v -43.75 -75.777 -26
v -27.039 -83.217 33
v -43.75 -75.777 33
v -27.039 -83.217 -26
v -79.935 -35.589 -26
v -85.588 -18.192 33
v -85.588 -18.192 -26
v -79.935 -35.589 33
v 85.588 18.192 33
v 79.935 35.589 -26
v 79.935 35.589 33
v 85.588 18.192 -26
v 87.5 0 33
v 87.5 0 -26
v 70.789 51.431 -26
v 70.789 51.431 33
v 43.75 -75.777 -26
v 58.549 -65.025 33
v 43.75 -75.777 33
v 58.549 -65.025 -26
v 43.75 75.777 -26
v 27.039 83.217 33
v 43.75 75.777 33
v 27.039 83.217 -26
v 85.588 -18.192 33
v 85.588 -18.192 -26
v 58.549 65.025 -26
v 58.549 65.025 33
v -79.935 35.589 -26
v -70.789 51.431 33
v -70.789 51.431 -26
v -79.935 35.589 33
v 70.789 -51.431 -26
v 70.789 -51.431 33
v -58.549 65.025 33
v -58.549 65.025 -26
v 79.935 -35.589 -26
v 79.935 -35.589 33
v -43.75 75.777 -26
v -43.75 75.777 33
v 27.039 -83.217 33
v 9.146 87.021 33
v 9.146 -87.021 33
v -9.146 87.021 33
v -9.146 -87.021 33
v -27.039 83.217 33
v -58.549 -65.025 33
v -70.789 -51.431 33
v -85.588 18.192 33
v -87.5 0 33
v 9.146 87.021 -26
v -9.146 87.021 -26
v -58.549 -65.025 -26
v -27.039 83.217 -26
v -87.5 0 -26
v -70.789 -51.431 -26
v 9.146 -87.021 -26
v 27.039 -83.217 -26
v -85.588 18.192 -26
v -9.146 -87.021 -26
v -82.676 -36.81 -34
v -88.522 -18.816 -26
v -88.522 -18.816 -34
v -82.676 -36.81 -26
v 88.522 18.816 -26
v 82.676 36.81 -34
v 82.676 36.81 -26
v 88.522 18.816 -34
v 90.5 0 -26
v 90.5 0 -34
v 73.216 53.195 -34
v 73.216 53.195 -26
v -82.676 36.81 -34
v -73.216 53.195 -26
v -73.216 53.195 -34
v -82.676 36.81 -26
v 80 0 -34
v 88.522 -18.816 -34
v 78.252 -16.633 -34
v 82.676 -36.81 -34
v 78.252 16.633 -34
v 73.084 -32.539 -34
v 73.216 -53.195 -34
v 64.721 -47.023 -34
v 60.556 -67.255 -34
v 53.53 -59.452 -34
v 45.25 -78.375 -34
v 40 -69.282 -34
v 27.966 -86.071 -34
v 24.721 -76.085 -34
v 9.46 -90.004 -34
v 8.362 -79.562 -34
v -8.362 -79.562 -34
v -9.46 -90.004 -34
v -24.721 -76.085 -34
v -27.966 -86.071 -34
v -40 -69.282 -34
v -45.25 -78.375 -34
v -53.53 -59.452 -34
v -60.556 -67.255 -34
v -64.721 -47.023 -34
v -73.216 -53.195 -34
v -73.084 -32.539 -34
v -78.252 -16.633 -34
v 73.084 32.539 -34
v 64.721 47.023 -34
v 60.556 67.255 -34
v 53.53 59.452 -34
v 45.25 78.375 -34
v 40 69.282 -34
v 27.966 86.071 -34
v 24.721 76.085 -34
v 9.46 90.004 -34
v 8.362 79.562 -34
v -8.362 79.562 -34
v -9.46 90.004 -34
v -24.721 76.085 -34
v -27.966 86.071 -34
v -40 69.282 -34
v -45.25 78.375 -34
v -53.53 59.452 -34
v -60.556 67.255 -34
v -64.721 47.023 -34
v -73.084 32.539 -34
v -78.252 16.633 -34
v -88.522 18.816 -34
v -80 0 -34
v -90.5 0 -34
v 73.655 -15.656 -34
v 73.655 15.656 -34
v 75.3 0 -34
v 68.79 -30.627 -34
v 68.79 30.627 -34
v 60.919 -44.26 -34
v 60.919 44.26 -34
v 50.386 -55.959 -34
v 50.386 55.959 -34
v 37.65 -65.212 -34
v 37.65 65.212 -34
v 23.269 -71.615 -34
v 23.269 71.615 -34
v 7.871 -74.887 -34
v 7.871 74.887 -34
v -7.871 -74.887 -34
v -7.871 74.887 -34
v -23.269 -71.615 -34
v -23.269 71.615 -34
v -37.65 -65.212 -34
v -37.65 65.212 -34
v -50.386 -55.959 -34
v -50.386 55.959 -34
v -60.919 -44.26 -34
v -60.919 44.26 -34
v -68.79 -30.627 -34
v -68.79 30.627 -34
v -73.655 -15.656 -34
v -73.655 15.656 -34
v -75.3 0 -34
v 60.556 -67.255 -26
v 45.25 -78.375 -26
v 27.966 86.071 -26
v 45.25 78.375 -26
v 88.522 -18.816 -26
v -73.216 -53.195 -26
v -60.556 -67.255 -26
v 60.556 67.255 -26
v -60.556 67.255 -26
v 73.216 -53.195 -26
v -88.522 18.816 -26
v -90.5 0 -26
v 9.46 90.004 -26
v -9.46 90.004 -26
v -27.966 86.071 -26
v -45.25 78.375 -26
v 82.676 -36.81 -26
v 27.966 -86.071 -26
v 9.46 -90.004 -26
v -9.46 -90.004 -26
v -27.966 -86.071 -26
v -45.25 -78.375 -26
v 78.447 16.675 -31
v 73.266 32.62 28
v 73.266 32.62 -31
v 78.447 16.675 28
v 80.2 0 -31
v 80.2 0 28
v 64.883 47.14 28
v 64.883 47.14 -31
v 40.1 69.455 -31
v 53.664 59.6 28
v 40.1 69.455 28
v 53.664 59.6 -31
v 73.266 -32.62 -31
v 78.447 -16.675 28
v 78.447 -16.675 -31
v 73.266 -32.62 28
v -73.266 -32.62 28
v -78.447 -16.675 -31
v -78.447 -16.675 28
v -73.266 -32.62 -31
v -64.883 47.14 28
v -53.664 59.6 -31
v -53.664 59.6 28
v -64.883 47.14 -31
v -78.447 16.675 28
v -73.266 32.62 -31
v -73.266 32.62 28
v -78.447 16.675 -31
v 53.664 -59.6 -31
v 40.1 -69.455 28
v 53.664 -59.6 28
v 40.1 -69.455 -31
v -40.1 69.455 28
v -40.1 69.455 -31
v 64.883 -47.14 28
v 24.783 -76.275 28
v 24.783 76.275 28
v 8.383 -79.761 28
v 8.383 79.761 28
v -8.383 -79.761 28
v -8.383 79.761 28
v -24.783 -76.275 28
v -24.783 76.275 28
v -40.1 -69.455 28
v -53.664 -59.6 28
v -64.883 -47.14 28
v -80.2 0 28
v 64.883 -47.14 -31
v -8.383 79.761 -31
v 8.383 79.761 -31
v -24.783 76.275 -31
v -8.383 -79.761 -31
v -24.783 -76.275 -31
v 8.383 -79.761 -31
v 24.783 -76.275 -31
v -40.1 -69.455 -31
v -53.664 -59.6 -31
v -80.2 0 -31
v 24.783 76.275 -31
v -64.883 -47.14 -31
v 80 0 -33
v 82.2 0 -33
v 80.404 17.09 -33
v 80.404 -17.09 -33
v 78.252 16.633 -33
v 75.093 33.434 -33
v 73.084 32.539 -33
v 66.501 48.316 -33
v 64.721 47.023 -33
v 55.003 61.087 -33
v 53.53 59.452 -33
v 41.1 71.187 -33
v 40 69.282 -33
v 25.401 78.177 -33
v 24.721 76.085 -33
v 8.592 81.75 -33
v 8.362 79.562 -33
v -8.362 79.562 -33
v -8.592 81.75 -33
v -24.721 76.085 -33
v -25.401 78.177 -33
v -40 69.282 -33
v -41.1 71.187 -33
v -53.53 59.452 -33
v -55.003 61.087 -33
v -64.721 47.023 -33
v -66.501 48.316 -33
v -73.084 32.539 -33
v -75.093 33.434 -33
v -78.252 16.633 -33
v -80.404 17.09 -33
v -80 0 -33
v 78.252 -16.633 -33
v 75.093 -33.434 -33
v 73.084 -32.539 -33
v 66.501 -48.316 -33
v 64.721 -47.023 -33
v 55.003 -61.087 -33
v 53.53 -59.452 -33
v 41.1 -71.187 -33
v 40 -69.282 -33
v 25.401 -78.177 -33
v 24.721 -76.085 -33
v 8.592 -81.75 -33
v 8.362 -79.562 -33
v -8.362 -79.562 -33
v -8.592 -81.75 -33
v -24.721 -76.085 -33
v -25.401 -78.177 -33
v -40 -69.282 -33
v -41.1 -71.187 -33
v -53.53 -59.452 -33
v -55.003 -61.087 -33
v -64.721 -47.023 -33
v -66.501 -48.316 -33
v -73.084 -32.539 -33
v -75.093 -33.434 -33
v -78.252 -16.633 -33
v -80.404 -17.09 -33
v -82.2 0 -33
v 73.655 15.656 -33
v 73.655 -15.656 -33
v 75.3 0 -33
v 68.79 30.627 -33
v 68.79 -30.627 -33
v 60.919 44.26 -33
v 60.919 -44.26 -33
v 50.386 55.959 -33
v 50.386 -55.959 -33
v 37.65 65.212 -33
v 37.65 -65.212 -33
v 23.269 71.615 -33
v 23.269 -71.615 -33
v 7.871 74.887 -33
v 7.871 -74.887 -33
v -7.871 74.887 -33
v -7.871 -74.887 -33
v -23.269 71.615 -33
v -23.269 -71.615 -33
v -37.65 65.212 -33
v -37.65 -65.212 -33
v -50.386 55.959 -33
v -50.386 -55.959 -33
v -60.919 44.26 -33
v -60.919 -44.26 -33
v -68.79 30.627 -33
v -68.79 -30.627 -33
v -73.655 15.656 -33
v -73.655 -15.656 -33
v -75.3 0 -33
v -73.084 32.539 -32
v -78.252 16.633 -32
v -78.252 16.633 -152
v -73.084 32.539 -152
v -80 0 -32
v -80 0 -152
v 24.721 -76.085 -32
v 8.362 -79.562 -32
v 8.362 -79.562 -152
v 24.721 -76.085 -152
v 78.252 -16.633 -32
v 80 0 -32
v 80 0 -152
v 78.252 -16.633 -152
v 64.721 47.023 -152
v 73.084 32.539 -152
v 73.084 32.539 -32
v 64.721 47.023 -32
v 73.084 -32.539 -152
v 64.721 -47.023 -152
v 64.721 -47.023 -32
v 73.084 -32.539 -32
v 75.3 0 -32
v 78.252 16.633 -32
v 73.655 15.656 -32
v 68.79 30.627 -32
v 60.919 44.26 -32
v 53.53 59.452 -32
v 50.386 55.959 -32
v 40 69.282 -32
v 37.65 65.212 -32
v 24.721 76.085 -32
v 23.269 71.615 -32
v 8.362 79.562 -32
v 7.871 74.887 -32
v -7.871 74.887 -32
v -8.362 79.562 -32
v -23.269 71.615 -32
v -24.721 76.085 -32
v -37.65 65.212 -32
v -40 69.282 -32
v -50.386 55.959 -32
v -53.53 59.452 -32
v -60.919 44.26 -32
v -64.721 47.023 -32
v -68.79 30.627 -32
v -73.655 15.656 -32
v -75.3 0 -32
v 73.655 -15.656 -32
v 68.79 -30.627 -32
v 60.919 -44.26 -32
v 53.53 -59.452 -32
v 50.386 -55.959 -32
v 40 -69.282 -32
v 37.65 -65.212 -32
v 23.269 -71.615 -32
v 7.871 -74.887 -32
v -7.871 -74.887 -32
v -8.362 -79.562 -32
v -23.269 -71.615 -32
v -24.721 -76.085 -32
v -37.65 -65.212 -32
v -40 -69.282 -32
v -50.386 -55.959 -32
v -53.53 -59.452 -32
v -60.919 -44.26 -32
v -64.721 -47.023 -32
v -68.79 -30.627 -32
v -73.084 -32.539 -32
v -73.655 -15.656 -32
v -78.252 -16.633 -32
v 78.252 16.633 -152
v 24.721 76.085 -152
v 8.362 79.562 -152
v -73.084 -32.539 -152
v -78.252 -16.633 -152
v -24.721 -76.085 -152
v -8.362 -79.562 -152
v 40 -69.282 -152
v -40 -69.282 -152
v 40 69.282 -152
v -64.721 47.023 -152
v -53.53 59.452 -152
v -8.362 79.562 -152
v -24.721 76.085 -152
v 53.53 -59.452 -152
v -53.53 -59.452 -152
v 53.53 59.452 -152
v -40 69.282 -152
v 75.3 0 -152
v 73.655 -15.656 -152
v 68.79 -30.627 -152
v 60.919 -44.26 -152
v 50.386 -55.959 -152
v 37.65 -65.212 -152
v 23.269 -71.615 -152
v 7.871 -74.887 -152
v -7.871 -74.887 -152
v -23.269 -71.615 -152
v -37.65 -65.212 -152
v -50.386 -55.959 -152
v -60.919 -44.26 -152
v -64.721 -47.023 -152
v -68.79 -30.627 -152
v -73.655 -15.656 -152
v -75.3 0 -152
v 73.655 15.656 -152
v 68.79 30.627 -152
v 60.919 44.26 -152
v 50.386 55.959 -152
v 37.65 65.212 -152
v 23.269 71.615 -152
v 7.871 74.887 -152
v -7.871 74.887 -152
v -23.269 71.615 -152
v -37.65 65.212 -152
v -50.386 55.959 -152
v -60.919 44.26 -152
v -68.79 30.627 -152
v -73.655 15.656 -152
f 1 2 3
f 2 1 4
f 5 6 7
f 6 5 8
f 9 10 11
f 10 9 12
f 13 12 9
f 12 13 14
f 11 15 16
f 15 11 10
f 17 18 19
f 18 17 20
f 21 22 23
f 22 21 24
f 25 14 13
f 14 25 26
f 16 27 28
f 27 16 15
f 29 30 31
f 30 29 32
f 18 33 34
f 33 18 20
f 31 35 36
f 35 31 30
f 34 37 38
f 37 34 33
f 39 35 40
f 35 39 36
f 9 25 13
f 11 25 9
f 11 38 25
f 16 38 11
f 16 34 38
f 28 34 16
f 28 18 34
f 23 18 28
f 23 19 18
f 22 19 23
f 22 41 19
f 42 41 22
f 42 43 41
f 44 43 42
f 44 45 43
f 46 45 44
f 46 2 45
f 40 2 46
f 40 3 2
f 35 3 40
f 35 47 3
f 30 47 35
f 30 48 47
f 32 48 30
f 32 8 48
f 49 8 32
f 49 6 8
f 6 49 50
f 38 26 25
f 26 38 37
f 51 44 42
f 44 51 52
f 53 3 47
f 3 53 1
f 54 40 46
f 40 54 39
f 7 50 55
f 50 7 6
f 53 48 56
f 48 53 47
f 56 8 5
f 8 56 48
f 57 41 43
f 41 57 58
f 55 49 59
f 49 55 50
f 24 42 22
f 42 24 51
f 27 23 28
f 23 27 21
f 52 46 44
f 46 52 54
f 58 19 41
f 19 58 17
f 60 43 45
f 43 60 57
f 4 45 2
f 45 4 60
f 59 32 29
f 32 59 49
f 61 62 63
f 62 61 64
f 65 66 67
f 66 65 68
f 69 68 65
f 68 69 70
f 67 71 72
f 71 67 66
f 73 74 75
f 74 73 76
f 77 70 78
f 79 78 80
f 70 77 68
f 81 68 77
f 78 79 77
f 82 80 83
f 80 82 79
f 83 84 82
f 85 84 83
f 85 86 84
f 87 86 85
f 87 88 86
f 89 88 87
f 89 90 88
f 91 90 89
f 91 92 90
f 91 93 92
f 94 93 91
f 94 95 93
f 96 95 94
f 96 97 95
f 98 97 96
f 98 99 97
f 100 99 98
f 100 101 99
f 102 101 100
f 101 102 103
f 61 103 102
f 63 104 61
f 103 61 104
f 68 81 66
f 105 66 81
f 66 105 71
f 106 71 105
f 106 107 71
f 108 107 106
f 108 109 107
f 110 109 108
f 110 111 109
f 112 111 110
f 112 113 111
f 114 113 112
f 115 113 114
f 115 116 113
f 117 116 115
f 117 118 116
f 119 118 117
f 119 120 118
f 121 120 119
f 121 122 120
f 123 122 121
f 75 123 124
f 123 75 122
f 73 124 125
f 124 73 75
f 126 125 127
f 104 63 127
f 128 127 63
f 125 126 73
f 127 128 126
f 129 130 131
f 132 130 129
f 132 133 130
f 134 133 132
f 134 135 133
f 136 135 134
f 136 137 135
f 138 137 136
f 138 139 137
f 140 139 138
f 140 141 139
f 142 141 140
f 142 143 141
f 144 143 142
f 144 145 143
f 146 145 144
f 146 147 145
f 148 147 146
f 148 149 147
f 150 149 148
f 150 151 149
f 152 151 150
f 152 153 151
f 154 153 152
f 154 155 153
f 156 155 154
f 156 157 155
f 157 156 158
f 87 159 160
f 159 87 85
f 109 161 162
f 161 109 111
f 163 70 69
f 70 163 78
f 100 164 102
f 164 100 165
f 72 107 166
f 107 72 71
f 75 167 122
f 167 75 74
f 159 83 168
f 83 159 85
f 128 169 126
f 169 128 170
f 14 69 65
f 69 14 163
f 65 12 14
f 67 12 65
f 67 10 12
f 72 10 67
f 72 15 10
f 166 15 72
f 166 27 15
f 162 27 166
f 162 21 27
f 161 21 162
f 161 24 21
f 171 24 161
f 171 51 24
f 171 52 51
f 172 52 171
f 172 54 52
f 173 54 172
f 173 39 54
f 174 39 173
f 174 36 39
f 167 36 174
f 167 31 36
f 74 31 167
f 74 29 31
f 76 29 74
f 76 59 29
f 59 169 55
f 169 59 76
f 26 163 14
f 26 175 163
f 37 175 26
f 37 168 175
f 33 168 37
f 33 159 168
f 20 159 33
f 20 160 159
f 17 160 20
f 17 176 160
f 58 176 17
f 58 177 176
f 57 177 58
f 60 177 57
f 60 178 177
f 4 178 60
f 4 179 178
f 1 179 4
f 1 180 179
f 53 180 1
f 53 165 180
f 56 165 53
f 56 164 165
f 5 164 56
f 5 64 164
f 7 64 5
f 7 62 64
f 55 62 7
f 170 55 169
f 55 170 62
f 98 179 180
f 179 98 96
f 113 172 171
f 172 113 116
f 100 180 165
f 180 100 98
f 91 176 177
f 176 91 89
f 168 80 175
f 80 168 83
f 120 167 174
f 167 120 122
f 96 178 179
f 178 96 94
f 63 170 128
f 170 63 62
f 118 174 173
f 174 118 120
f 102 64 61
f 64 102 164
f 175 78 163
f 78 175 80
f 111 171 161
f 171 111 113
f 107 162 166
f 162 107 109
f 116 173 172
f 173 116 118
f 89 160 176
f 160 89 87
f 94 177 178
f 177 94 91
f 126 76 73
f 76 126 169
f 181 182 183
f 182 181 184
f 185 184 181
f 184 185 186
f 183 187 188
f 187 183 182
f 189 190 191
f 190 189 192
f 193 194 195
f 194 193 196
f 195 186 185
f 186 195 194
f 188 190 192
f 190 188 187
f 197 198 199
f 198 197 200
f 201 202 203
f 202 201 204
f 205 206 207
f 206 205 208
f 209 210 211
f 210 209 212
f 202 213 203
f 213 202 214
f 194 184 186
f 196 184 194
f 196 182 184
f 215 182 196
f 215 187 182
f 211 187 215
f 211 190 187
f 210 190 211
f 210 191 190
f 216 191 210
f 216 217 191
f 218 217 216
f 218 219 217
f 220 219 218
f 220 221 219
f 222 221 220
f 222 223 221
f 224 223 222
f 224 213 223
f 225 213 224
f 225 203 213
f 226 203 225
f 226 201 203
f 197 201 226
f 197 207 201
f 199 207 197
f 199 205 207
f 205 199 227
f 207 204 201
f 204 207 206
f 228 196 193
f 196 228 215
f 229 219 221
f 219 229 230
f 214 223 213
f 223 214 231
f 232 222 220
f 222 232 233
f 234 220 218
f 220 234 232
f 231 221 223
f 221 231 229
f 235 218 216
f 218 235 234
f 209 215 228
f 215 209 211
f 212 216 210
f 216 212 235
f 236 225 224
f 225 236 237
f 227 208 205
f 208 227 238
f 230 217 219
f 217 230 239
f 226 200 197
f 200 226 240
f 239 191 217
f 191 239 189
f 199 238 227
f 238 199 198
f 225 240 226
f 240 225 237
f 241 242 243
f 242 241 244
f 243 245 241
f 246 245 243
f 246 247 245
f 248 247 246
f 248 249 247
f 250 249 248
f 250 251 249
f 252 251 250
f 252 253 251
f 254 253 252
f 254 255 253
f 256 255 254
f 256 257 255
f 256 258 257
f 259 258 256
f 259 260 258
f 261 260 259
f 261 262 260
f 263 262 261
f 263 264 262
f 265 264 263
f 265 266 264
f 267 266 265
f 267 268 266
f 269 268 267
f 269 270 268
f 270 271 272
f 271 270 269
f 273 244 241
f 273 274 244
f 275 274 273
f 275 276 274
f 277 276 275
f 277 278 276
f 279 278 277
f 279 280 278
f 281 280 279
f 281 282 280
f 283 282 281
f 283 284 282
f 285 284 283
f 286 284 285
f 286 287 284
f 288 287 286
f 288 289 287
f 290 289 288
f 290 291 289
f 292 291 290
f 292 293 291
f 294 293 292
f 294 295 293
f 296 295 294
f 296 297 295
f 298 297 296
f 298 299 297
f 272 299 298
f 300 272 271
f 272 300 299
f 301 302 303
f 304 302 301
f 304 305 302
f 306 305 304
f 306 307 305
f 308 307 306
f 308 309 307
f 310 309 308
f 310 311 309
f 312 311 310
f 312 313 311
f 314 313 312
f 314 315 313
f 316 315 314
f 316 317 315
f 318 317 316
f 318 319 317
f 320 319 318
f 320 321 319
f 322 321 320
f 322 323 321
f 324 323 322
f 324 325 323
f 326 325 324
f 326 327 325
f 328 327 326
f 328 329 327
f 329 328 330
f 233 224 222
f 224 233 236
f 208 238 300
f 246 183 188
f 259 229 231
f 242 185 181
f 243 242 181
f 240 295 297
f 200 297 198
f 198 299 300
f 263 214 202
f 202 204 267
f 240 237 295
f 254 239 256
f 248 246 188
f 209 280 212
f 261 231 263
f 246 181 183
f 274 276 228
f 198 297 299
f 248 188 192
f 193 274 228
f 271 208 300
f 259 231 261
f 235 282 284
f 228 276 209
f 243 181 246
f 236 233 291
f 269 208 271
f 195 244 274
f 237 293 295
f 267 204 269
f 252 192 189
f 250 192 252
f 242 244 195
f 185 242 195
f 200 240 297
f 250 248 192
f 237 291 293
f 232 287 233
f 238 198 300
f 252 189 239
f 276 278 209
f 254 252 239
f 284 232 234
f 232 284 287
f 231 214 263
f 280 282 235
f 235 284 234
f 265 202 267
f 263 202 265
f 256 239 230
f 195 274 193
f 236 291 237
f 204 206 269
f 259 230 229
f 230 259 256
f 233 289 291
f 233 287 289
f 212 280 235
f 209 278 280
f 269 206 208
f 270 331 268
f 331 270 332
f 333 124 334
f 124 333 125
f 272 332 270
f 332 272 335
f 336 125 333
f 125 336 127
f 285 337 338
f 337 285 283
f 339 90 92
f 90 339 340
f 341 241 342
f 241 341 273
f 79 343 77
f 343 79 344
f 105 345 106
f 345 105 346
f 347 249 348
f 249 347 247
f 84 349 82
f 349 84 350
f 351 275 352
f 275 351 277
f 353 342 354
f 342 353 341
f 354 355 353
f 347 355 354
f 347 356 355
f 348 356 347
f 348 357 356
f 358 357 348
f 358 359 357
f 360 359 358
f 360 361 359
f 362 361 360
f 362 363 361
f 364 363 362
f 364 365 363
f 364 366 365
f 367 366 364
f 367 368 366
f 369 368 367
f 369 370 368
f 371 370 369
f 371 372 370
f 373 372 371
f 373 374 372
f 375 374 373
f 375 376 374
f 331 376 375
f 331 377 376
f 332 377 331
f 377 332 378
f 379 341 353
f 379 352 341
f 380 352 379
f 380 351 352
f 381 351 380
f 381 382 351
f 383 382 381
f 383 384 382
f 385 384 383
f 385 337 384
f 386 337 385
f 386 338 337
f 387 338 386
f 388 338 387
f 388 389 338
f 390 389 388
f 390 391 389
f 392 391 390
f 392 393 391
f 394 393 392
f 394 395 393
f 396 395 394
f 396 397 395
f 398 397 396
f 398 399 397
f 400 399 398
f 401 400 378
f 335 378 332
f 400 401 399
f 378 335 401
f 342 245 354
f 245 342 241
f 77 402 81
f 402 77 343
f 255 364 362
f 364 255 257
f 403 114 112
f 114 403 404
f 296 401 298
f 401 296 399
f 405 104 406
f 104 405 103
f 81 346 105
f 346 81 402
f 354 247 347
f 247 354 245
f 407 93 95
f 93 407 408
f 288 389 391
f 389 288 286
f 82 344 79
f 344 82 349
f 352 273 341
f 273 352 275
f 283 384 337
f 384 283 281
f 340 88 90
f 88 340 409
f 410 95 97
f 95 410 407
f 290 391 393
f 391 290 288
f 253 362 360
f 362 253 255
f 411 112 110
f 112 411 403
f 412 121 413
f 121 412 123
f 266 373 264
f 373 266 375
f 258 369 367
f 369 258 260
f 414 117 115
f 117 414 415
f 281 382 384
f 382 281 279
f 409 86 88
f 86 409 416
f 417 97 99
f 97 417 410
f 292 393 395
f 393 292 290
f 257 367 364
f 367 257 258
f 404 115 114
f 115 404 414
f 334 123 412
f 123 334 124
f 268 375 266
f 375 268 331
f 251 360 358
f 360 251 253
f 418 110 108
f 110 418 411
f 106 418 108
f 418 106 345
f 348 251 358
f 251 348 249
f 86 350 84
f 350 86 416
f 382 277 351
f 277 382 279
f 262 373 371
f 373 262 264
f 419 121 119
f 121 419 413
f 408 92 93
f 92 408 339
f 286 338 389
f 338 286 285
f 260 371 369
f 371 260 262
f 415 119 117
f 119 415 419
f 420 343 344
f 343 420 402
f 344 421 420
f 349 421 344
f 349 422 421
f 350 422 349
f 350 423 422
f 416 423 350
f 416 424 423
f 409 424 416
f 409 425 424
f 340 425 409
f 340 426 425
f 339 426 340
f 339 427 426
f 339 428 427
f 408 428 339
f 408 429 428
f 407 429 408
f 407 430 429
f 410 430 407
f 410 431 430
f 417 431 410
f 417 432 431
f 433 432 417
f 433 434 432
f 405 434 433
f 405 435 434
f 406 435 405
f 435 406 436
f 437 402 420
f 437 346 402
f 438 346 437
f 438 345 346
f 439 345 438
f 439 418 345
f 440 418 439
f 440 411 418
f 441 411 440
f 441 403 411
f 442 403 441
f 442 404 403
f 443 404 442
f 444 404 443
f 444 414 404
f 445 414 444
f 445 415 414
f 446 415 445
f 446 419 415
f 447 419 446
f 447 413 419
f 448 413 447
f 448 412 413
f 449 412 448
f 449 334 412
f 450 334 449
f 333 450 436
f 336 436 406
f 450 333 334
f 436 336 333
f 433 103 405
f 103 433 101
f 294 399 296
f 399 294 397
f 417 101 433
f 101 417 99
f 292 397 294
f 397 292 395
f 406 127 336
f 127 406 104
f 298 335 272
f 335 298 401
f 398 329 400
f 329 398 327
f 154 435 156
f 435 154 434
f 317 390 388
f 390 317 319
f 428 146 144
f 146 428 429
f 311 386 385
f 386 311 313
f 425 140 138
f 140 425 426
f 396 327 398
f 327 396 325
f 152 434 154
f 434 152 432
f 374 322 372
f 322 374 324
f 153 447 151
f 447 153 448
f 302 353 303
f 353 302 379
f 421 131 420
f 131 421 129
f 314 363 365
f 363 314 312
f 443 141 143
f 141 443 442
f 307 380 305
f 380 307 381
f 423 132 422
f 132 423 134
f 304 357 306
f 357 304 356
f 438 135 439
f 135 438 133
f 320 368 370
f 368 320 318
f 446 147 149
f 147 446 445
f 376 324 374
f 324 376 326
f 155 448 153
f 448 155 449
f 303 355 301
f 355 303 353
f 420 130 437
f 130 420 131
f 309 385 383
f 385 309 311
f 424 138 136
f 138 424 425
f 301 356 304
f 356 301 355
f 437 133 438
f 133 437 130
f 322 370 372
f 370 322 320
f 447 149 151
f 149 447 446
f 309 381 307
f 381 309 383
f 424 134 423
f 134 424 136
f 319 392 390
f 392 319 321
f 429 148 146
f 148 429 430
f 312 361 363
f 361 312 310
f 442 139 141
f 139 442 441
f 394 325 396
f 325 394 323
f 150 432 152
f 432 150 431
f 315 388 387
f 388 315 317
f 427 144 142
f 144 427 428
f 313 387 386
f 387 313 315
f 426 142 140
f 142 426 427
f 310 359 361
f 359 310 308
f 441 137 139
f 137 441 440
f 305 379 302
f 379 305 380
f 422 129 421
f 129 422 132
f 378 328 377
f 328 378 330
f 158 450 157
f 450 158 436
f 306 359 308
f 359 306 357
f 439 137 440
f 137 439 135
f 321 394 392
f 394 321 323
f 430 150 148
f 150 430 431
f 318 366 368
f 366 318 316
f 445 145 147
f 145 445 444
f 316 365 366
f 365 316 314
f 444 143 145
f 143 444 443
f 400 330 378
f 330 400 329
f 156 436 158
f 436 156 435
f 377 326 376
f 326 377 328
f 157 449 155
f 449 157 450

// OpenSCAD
// Parameters
nominal_diameter_mm = 160; //[80:320:1]
pipe_outer_diameter_mm = 160; //[80:320:1]
cap_outer_diameter_mm = 175; //[120:350:1]
wall_thickness_mm = 4.5; //[2.5:9:0.1]
socket_depth_mm = 60; //[30:120:1]
end_thickness_mm = 6; //[3:15:0.5]
clearance_mm = 0.4; //[0.1:1.2:0.05]
chamfer_mm = 2; //[0:6:0.5]
fillet_radius_mm = 1.5; //[0:5:0.5]
stop_shoulder_height_mm = 3; //[1:8:0.5]
stop_shoulder_radial_mm = 2; //[1:6:0.5]
grip_rim_radial_mm = 3; //[1:8:0.5]
grip_rim_height_mm = 8; //[3:20:1]
overlap_mm = 1; //[0.5:2:0.1]
pipe_wall_mm = 4.7; //[2.5:10:0.1]
pipe_stub_length_mm = 120; //[60:240:1]

// HT Pipe - complete geometry
module ht_pipe() {
  color([0.85, 0.85, 0.8]) {
    difference() {
      // Outer pipe
      cylinder(r=pipe_outer_diameter_mm/2, h=pipe_stub_length_mm, center=true);
      // Inner pipe
      translate([0, 0, -overlap_mm/2])
        cylinder(r=pipe_outer_diameter_mm/2 - pipe_wall_mm, h=pipe_stub_length_mm + overlap_mm, center=true);
    }
  }
}

// Cap assembly
module cap() {
  color([0.75, 0.75, 0.77]) {
    difference() {
      union() {
        // Cap body
        translate([0, 0, 0])
          cylinder(r=cap_outer_diameter_mm/2, h=socket_depth_mm + end_thickness_mm, center=true);
        // Outer grip rim
        translate([0, 0, -(socket_depth_mm + end_thickness_mm)/2 + grip_rim_height_mm/2 - overlap_mm])
          cylinder(r=cap_outer_diameter_mm/2 + grip_rim_radial_mm, h=grip_rim_height_mm, center=true);
        // Closed end face
        translate([0, 0, (socket_depth_mm + end_thickness_mm)/2 - end_thickness_mm/2])
          cylinder(r=(cap_outer_diameter_mm/2) - wall_thickness_mm, h=end_thickness_mm, center=true);
        // Socket stop shoulder
        translate([0, 0, (socket_depth_mm + end_thickness_mm)/2 - end_thickness_mm - stop_shoulder_height_mm/2])
          cylinder(r=((pipe_outer_diameter_mm + clearance_mm)/2) - stop_shoulder_radial_mm, h=stop_shoulder_height_mm, center=true);
      }
      // Internal socket
      translate([0, 0, (socket_depth_mm + overlap_mm)/2 - (socket_depth_mm + end_thickness_mm)/2])
        cylinder(r=(pipe_outer_diameter_mm + clearance_mm)/2, h=socket_depth_mm + overlap_mm, center=true);
      // Socket mouth chamfer
      translate([0, 0, -(socket_depth_mm + end_thickness_mm)/2 + chamfer_mm/2])
        cylinder(r1=(pipe_outer_diameter_mm + clearance_mm)/2 + chamfer_mm, r2=(pipe_outer_diameter_mm + clearance_mm)/2, h=chamfer_mm, center=true);
    }
  }
}

// Assembly
module assembly() {
  cap();
  translate([0, 0, -(socket_depth_mm + end_thickness_mm)/2 - pipe_stub_length_mm/2 + overlap_mm])
    ht_pipe();
}

assembly();
